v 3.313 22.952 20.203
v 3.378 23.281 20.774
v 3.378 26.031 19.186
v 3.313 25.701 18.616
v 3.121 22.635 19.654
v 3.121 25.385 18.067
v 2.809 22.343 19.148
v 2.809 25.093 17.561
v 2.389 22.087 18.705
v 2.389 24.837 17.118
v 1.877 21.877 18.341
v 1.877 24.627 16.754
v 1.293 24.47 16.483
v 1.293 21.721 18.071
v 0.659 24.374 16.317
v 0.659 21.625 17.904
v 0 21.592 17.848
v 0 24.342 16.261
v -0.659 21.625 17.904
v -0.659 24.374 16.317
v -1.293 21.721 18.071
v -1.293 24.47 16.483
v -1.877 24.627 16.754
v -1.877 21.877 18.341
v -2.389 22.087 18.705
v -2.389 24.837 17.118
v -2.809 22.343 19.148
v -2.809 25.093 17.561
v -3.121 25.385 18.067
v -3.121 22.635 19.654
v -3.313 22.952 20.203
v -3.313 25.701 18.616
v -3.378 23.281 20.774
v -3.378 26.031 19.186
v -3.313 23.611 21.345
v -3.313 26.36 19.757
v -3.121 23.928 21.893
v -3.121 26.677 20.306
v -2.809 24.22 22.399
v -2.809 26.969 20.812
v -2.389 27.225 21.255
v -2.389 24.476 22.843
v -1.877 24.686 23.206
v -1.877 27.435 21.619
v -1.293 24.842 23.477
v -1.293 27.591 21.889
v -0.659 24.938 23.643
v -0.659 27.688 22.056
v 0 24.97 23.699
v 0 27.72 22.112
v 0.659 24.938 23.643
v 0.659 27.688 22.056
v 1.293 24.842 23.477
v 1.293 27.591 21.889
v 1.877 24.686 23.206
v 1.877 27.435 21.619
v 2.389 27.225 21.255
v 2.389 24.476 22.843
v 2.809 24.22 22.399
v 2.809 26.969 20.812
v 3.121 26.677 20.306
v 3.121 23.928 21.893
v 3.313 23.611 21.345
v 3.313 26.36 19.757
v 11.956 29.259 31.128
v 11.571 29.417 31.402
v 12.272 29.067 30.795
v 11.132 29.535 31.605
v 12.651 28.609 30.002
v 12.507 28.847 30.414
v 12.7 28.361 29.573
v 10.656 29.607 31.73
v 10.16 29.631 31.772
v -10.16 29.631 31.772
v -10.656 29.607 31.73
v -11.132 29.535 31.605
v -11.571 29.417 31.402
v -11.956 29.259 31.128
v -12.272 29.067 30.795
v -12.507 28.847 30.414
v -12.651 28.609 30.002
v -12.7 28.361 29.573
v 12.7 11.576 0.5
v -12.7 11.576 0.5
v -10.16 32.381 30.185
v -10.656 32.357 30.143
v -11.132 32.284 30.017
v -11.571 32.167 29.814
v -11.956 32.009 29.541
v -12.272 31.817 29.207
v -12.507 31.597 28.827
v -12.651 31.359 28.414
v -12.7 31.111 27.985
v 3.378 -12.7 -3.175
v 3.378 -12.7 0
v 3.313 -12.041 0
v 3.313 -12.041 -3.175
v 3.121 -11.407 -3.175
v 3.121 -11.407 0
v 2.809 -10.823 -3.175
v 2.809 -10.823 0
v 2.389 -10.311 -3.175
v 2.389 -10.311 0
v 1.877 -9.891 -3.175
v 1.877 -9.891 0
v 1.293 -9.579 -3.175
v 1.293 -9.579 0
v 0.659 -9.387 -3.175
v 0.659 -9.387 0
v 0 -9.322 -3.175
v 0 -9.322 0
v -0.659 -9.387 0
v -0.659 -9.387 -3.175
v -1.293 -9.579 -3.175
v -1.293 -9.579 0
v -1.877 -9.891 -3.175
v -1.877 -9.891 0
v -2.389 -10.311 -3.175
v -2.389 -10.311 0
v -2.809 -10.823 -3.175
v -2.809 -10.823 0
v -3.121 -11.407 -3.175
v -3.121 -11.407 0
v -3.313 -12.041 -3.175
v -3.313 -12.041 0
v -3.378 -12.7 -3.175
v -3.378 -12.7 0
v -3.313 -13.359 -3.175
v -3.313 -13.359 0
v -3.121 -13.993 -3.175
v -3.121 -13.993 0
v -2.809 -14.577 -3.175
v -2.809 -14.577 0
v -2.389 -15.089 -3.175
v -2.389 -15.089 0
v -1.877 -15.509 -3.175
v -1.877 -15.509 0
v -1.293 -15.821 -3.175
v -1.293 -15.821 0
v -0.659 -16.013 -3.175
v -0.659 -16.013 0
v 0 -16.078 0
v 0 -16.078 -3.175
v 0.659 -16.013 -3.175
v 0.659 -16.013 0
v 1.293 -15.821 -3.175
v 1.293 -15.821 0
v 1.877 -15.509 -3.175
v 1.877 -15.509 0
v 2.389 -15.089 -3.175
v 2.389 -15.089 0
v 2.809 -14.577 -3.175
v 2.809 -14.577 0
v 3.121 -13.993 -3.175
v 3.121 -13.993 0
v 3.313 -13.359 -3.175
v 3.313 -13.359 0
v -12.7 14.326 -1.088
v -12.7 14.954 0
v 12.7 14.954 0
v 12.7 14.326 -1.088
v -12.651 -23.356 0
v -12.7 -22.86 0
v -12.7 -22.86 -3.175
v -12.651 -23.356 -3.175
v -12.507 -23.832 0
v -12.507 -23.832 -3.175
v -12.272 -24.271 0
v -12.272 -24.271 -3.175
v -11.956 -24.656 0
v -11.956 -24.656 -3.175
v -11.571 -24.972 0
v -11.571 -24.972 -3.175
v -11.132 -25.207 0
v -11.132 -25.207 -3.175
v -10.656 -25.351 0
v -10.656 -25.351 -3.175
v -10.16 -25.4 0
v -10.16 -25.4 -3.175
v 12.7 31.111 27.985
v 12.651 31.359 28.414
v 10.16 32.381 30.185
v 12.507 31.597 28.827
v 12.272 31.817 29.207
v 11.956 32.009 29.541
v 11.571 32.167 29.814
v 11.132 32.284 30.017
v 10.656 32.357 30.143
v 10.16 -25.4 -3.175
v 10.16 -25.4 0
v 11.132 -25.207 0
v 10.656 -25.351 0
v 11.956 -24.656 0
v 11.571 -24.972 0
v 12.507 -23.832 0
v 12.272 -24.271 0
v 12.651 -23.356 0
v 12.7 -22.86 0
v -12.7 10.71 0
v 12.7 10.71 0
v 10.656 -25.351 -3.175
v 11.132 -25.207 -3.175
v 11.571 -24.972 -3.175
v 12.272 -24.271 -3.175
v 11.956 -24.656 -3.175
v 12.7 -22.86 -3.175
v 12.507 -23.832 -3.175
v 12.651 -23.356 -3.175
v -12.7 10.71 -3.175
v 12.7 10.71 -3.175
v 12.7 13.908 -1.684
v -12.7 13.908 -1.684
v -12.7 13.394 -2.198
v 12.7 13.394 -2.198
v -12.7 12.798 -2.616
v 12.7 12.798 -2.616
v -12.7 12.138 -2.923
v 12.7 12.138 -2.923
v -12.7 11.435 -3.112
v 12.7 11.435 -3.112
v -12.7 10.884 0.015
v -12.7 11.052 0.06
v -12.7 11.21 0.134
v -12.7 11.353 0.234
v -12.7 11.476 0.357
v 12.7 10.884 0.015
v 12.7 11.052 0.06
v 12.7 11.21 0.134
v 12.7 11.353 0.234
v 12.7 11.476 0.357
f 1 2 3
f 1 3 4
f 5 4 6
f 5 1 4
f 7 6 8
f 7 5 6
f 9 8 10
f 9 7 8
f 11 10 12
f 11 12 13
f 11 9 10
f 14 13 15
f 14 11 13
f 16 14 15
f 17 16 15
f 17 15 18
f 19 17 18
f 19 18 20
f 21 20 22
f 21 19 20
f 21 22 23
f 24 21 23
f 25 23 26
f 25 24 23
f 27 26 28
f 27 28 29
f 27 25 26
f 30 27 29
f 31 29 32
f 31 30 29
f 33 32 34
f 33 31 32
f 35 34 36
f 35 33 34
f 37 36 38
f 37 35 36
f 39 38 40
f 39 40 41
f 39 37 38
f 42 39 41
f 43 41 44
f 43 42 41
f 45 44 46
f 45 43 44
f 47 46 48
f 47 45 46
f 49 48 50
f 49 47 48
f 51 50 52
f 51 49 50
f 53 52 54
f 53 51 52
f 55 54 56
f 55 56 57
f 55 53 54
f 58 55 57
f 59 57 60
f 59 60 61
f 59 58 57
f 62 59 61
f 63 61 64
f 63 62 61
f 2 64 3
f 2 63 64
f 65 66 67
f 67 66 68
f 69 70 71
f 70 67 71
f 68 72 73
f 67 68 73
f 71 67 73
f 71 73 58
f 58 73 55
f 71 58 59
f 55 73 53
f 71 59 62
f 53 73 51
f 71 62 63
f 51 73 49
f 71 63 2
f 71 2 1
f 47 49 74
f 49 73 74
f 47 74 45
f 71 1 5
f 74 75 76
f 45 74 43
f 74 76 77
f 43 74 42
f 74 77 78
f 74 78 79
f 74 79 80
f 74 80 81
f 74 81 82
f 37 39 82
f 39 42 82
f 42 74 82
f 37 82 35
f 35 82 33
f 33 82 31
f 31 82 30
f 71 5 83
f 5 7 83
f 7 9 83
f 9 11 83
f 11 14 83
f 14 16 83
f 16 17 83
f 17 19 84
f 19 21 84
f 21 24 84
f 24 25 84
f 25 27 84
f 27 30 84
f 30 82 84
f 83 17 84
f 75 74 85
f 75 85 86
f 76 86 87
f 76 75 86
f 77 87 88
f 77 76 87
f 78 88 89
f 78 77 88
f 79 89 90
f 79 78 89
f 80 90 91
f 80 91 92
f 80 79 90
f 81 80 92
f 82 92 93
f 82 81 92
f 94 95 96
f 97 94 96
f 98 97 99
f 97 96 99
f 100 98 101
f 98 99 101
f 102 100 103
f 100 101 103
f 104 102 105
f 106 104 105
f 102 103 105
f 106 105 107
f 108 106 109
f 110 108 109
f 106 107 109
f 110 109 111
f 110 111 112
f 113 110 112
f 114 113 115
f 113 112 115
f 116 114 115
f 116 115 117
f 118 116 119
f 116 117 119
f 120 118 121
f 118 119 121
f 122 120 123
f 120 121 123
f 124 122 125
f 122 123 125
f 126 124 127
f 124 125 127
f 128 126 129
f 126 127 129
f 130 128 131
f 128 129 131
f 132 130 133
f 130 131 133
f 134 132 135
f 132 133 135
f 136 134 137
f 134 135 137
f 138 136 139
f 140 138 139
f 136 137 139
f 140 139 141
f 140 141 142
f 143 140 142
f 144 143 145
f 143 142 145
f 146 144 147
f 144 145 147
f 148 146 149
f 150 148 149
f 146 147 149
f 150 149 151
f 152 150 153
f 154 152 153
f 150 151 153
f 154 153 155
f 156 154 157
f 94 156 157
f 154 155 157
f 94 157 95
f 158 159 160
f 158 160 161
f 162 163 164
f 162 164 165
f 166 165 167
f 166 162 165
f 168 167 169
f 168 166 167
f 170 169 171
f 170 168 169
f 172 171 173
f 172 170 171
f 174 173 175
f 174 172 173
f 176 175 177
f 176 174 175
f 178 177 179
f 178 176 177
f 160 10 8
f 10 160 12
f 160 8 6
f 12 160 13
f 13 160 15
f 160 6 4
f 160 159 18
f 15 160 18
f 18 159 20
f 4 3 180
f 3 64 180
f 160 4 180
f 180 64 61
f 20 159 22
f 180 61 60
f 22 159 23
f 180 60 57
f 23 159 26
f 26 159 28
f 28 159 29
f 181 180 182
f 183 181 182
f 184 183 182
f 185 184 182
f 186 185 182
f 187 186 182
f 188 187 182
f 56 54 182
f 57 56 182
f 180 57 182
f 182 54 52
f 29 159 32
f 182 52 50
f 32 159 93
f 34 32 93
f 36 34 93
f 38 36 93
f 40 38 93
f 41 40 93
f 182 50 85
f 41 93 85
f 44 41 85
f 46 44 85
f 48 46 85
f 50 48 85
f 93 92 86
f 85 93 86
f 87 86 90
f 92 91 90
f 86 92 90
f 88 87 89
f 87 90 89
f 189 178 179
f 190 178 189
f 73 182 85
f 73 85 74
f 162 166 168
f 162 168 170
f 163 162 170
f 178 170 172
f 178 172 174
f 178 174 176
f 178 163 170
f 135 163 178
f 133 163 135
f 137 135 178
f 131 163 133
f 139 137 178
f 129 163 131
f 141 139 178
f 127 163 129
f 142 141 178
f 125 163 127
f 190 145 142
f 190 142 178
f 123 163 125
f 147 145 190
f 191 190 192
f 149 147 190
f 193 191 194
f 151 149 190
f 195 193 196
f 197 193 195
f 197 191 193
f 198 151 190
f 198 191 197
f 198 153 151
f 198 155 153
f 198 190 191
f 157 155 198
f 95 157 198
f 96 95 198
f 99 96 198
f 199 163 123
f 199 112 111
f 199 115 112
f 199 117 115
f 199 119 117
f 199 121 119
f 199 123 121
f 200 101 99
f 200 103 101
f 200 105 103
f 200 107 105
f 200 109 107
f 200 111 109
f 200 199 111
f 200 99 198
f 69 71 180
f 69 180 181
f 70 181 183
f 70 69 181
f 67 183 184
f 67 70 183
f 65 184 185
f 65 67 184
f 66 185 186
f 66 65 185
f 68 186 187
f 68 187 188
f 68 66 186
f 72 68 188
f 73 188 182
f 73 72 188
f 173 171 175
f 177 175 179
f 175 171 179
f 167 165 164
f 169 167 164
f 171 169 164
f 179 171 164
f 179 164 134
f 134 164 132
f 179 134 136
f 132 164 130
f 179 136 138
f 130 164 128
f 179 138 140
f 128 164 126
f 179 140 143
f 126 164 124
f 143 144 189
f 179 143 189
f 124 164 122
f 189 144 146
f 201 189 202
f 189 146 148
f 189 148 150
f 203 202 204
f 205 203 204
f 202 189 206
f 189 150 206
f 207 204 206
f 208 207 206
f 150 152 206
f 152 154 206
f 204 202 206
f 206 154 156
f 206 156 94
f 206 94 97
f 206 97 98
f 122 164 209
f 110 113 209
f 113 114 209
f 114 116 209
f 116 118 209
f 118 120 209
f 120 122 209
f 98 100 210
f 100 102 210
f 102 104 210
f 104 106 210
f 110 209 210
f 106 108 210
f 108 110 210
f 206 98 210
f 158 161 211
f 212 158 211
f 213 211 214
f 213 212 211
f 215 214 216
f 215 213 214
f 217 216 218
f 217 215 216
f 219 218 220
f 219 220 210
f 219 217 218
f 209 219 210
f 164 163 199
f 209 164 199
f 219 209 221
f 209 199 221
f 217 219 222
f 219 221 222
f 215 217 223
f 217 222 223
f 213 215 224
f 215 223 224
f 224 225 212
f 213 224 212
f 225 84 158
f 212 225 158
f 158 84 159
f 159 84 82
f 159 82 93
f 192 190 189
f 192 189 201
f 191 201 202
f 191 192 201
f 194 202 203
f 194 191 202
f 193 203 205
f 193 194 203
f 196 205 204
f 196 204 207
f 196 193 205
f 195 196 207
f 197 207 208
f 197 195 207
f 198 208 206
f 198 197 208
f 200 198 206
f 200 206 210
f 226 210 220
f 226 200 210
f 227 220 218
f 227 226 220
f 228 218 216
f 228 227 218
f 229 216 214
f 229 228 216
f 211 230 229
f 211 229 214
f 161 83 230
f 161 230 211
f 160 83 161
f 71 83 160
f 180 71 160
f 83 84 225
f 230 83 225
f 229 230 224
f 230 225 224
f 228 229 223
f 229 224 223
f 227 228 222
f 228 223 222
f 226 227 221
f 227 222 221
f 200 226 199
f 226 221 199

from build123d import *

# Parameters (mm, degrees)
SKETCH1_R                  = 3.3782
BASE_FLANGE1_DEPTH         = 3.175
SKETCHED_START             = -12.7
SKETCHED_BEND1_DEPTH       = 25.4
SKETCHED_START_2           = -10.229596
SKETCHED_BEND1_2_DEPTH     = 6.8513959
SKETCHED_START_3           = 3.3782001
SKETCHED_BEND1_3_DEPTH     = 6.7817999
SKETCHED_BEND1_4_DEPTH     = 25.4
SKETCHED_START_4           = 9.775295033
SKETCHED_BEND1_5_OUTLINE_R = 3.3782
SKETCHED_BEND1_5_DEPTH     = 3.175


with BuildPart() as part:
    # Base-Flange1: sheet metal written as solids
    # Sketch1 → Base-Flange1 (new body)
    with BuildSketch(Plane.XY):
        with BuildLine():
            Line((-10.16, -25.4), (10.16, -25.4))
            ThreePointArc((10.16, -25.4), (11.956051224, -24.656051224), (12.7, -22.86))
            Line((12.7, -22.86), (12.7, 46.99))
            ThreePointArc((12.7, 46.99), (11.956051224, 48.786051224), (10.16, 49.53))
            Line((10.16, 49.53), (-10.16, 49.53))
            ThreePointArc((-10.16, 49.53), (-11.956051224, 48.786051224), (-12.7, 46.99))
            Line((-12.7, 46.99), (-12.7, -22.86))
            ThreePointArc((-12.7, -22.86), (-11.956051224, -24.656051224), (-10.16, -25.4))
        make_face()
        with Locations((0, 36.83)):
            Circle(SKETCH1_R, mode=Mode.SUBTRACT)
        with Locations((0, -12.7)):
            Circle(SKETCH1_R, mode=Mode.SUBTRACT)
    extrude(amount=-BASE_FLANGE1_DEPTH)

    # Sketched Bend1: read off the stored shape, not the designer's step
    # Sketched Bend1 outline → Sketched Bend1 (cut)
    with BuildSketch(Plane.YZ.offset(SKETCHED_START)):
        with BuildLine():
            Line((49.53, 0), (14.953712647, 0))
            Line((14.953712647, 0), (14.325844229, -1.0875))
            ThreePointArc((14.325844229, -1.0875), (12.797688168, -2.615656061), (10.710188168, -3.175))
            Line((10.710188168, -3.175), (49.53, -3.175))
            Line((49.53, -3.175), (49.53, 0))
        make_face()
    extrude(amount=SKETCHED_BEND1_DEPTH, mode=Mode.SUBTRACT)

    # Sketched Bend1 2 outline → Sketched Bend1 2 (add)
    with BuildSketch(Plane.YZ.offset(SKETCHED_START_2)):
        with BuildLine():
            Line((29.631307656, 31.772340289), (11.576213572, 0.5))
            ThreePointArc((11.576213572, 0.5), (11.210188168, 0.133974596), (10.710188168, 0))
            Line((10.710188168, 0), (14.953712647, 0))
            Line((14.953712647, 0), (32.380938313, 30.184840289))
            Line((32.380938313, 30.184840289), (29.631307656, 31.772340289))
        make_face()
    extrude(amount=SKETCHED_BEND1_2_DEPTH)

    # Sketched Bend1 3 outline → Sketched Bend1 3 (add)
    with BuildSketch(Plane.YZ.offset(SKETCHED_START_3)):
        with BuildLine():
            Line((29.631307656, 31.772340289), (11.576213572, 0.5))
            ThreePointArc((11.576213572, 0.5), (11.210188168, 0.133974596), (10.710188168, 0))
            Line((10.710188168, 0), (14.953712647, 0))
            Line((14.953712647, 0), (32.380938313, 30.184840289))
            Line((32.380938313, 30.184840289), (29.631307656, 31.772340289))
        make_face()
    extrude(amount=SKETCHED_BEND1_3_DEPTH)

    # Sketched Bend1 4 outline → Sketched Bend1 4 (add)
    with BuildSketch(Plane.YZ.offset(SKETCHED_START)):
        with BuildLine():
            Line((29.631307656, 31.772340289), (11.576213572, 0.5))
            ThreePointArc((11.576213572, 0.5), (11.210188168, 0.133974596), (10.710188168, 0))
            Line((10.710188168, 0), (14.953712647, 0))
            Line((14.953712647, 0), (32.380938313, 30.184840289))
            Line((32.380938313, 30.184840289), (29.631307656, 31.772340289))
        make_face()
    extrude(amount=SKETCHED_BEND1_4_DEPTH)

    # Sketched Bend1 5 outline → Sketched Bend1 5 (cut)
    with BuildSketch(Plane(origin=(0, 0, 0), x_dir=(1, 0, 0), z_dir=(0, 0.8660254037844399, -0.49999999999999795)).offset(SKETCHED_START_4)):
        with BuildLine():
            Line((-12.7, -42.331307656), (-10.16, -42.331307656))
            ThreePointArc((-10.16, -42.331307656), (-11.956051224, -41.58735888), (-12.7, -39.791307656))
            Line((-12.7, -39.791307656), (-12.7, -42.331307656))
        make_face()
        with BuildLine():
            ThreePointArc((12.7, -39.791307656), (11.956051224, -41.58735888), (10.16, -42.331307656))
            Line((10.16, -42.331307656), (12.7, -42.331307656))
            Line((12.7, -42.331307656), (12.7, -39.791307656))
        make_face()
        with Locations((0, -29.631307656)):
            Circle(SKETCHED_BEND1_5_OUTLINE_R)
    extrude(amount=SKETCHED_BEND1_5_DEPTH, mode=Mode.SUBTRACT)


solid = part.part
